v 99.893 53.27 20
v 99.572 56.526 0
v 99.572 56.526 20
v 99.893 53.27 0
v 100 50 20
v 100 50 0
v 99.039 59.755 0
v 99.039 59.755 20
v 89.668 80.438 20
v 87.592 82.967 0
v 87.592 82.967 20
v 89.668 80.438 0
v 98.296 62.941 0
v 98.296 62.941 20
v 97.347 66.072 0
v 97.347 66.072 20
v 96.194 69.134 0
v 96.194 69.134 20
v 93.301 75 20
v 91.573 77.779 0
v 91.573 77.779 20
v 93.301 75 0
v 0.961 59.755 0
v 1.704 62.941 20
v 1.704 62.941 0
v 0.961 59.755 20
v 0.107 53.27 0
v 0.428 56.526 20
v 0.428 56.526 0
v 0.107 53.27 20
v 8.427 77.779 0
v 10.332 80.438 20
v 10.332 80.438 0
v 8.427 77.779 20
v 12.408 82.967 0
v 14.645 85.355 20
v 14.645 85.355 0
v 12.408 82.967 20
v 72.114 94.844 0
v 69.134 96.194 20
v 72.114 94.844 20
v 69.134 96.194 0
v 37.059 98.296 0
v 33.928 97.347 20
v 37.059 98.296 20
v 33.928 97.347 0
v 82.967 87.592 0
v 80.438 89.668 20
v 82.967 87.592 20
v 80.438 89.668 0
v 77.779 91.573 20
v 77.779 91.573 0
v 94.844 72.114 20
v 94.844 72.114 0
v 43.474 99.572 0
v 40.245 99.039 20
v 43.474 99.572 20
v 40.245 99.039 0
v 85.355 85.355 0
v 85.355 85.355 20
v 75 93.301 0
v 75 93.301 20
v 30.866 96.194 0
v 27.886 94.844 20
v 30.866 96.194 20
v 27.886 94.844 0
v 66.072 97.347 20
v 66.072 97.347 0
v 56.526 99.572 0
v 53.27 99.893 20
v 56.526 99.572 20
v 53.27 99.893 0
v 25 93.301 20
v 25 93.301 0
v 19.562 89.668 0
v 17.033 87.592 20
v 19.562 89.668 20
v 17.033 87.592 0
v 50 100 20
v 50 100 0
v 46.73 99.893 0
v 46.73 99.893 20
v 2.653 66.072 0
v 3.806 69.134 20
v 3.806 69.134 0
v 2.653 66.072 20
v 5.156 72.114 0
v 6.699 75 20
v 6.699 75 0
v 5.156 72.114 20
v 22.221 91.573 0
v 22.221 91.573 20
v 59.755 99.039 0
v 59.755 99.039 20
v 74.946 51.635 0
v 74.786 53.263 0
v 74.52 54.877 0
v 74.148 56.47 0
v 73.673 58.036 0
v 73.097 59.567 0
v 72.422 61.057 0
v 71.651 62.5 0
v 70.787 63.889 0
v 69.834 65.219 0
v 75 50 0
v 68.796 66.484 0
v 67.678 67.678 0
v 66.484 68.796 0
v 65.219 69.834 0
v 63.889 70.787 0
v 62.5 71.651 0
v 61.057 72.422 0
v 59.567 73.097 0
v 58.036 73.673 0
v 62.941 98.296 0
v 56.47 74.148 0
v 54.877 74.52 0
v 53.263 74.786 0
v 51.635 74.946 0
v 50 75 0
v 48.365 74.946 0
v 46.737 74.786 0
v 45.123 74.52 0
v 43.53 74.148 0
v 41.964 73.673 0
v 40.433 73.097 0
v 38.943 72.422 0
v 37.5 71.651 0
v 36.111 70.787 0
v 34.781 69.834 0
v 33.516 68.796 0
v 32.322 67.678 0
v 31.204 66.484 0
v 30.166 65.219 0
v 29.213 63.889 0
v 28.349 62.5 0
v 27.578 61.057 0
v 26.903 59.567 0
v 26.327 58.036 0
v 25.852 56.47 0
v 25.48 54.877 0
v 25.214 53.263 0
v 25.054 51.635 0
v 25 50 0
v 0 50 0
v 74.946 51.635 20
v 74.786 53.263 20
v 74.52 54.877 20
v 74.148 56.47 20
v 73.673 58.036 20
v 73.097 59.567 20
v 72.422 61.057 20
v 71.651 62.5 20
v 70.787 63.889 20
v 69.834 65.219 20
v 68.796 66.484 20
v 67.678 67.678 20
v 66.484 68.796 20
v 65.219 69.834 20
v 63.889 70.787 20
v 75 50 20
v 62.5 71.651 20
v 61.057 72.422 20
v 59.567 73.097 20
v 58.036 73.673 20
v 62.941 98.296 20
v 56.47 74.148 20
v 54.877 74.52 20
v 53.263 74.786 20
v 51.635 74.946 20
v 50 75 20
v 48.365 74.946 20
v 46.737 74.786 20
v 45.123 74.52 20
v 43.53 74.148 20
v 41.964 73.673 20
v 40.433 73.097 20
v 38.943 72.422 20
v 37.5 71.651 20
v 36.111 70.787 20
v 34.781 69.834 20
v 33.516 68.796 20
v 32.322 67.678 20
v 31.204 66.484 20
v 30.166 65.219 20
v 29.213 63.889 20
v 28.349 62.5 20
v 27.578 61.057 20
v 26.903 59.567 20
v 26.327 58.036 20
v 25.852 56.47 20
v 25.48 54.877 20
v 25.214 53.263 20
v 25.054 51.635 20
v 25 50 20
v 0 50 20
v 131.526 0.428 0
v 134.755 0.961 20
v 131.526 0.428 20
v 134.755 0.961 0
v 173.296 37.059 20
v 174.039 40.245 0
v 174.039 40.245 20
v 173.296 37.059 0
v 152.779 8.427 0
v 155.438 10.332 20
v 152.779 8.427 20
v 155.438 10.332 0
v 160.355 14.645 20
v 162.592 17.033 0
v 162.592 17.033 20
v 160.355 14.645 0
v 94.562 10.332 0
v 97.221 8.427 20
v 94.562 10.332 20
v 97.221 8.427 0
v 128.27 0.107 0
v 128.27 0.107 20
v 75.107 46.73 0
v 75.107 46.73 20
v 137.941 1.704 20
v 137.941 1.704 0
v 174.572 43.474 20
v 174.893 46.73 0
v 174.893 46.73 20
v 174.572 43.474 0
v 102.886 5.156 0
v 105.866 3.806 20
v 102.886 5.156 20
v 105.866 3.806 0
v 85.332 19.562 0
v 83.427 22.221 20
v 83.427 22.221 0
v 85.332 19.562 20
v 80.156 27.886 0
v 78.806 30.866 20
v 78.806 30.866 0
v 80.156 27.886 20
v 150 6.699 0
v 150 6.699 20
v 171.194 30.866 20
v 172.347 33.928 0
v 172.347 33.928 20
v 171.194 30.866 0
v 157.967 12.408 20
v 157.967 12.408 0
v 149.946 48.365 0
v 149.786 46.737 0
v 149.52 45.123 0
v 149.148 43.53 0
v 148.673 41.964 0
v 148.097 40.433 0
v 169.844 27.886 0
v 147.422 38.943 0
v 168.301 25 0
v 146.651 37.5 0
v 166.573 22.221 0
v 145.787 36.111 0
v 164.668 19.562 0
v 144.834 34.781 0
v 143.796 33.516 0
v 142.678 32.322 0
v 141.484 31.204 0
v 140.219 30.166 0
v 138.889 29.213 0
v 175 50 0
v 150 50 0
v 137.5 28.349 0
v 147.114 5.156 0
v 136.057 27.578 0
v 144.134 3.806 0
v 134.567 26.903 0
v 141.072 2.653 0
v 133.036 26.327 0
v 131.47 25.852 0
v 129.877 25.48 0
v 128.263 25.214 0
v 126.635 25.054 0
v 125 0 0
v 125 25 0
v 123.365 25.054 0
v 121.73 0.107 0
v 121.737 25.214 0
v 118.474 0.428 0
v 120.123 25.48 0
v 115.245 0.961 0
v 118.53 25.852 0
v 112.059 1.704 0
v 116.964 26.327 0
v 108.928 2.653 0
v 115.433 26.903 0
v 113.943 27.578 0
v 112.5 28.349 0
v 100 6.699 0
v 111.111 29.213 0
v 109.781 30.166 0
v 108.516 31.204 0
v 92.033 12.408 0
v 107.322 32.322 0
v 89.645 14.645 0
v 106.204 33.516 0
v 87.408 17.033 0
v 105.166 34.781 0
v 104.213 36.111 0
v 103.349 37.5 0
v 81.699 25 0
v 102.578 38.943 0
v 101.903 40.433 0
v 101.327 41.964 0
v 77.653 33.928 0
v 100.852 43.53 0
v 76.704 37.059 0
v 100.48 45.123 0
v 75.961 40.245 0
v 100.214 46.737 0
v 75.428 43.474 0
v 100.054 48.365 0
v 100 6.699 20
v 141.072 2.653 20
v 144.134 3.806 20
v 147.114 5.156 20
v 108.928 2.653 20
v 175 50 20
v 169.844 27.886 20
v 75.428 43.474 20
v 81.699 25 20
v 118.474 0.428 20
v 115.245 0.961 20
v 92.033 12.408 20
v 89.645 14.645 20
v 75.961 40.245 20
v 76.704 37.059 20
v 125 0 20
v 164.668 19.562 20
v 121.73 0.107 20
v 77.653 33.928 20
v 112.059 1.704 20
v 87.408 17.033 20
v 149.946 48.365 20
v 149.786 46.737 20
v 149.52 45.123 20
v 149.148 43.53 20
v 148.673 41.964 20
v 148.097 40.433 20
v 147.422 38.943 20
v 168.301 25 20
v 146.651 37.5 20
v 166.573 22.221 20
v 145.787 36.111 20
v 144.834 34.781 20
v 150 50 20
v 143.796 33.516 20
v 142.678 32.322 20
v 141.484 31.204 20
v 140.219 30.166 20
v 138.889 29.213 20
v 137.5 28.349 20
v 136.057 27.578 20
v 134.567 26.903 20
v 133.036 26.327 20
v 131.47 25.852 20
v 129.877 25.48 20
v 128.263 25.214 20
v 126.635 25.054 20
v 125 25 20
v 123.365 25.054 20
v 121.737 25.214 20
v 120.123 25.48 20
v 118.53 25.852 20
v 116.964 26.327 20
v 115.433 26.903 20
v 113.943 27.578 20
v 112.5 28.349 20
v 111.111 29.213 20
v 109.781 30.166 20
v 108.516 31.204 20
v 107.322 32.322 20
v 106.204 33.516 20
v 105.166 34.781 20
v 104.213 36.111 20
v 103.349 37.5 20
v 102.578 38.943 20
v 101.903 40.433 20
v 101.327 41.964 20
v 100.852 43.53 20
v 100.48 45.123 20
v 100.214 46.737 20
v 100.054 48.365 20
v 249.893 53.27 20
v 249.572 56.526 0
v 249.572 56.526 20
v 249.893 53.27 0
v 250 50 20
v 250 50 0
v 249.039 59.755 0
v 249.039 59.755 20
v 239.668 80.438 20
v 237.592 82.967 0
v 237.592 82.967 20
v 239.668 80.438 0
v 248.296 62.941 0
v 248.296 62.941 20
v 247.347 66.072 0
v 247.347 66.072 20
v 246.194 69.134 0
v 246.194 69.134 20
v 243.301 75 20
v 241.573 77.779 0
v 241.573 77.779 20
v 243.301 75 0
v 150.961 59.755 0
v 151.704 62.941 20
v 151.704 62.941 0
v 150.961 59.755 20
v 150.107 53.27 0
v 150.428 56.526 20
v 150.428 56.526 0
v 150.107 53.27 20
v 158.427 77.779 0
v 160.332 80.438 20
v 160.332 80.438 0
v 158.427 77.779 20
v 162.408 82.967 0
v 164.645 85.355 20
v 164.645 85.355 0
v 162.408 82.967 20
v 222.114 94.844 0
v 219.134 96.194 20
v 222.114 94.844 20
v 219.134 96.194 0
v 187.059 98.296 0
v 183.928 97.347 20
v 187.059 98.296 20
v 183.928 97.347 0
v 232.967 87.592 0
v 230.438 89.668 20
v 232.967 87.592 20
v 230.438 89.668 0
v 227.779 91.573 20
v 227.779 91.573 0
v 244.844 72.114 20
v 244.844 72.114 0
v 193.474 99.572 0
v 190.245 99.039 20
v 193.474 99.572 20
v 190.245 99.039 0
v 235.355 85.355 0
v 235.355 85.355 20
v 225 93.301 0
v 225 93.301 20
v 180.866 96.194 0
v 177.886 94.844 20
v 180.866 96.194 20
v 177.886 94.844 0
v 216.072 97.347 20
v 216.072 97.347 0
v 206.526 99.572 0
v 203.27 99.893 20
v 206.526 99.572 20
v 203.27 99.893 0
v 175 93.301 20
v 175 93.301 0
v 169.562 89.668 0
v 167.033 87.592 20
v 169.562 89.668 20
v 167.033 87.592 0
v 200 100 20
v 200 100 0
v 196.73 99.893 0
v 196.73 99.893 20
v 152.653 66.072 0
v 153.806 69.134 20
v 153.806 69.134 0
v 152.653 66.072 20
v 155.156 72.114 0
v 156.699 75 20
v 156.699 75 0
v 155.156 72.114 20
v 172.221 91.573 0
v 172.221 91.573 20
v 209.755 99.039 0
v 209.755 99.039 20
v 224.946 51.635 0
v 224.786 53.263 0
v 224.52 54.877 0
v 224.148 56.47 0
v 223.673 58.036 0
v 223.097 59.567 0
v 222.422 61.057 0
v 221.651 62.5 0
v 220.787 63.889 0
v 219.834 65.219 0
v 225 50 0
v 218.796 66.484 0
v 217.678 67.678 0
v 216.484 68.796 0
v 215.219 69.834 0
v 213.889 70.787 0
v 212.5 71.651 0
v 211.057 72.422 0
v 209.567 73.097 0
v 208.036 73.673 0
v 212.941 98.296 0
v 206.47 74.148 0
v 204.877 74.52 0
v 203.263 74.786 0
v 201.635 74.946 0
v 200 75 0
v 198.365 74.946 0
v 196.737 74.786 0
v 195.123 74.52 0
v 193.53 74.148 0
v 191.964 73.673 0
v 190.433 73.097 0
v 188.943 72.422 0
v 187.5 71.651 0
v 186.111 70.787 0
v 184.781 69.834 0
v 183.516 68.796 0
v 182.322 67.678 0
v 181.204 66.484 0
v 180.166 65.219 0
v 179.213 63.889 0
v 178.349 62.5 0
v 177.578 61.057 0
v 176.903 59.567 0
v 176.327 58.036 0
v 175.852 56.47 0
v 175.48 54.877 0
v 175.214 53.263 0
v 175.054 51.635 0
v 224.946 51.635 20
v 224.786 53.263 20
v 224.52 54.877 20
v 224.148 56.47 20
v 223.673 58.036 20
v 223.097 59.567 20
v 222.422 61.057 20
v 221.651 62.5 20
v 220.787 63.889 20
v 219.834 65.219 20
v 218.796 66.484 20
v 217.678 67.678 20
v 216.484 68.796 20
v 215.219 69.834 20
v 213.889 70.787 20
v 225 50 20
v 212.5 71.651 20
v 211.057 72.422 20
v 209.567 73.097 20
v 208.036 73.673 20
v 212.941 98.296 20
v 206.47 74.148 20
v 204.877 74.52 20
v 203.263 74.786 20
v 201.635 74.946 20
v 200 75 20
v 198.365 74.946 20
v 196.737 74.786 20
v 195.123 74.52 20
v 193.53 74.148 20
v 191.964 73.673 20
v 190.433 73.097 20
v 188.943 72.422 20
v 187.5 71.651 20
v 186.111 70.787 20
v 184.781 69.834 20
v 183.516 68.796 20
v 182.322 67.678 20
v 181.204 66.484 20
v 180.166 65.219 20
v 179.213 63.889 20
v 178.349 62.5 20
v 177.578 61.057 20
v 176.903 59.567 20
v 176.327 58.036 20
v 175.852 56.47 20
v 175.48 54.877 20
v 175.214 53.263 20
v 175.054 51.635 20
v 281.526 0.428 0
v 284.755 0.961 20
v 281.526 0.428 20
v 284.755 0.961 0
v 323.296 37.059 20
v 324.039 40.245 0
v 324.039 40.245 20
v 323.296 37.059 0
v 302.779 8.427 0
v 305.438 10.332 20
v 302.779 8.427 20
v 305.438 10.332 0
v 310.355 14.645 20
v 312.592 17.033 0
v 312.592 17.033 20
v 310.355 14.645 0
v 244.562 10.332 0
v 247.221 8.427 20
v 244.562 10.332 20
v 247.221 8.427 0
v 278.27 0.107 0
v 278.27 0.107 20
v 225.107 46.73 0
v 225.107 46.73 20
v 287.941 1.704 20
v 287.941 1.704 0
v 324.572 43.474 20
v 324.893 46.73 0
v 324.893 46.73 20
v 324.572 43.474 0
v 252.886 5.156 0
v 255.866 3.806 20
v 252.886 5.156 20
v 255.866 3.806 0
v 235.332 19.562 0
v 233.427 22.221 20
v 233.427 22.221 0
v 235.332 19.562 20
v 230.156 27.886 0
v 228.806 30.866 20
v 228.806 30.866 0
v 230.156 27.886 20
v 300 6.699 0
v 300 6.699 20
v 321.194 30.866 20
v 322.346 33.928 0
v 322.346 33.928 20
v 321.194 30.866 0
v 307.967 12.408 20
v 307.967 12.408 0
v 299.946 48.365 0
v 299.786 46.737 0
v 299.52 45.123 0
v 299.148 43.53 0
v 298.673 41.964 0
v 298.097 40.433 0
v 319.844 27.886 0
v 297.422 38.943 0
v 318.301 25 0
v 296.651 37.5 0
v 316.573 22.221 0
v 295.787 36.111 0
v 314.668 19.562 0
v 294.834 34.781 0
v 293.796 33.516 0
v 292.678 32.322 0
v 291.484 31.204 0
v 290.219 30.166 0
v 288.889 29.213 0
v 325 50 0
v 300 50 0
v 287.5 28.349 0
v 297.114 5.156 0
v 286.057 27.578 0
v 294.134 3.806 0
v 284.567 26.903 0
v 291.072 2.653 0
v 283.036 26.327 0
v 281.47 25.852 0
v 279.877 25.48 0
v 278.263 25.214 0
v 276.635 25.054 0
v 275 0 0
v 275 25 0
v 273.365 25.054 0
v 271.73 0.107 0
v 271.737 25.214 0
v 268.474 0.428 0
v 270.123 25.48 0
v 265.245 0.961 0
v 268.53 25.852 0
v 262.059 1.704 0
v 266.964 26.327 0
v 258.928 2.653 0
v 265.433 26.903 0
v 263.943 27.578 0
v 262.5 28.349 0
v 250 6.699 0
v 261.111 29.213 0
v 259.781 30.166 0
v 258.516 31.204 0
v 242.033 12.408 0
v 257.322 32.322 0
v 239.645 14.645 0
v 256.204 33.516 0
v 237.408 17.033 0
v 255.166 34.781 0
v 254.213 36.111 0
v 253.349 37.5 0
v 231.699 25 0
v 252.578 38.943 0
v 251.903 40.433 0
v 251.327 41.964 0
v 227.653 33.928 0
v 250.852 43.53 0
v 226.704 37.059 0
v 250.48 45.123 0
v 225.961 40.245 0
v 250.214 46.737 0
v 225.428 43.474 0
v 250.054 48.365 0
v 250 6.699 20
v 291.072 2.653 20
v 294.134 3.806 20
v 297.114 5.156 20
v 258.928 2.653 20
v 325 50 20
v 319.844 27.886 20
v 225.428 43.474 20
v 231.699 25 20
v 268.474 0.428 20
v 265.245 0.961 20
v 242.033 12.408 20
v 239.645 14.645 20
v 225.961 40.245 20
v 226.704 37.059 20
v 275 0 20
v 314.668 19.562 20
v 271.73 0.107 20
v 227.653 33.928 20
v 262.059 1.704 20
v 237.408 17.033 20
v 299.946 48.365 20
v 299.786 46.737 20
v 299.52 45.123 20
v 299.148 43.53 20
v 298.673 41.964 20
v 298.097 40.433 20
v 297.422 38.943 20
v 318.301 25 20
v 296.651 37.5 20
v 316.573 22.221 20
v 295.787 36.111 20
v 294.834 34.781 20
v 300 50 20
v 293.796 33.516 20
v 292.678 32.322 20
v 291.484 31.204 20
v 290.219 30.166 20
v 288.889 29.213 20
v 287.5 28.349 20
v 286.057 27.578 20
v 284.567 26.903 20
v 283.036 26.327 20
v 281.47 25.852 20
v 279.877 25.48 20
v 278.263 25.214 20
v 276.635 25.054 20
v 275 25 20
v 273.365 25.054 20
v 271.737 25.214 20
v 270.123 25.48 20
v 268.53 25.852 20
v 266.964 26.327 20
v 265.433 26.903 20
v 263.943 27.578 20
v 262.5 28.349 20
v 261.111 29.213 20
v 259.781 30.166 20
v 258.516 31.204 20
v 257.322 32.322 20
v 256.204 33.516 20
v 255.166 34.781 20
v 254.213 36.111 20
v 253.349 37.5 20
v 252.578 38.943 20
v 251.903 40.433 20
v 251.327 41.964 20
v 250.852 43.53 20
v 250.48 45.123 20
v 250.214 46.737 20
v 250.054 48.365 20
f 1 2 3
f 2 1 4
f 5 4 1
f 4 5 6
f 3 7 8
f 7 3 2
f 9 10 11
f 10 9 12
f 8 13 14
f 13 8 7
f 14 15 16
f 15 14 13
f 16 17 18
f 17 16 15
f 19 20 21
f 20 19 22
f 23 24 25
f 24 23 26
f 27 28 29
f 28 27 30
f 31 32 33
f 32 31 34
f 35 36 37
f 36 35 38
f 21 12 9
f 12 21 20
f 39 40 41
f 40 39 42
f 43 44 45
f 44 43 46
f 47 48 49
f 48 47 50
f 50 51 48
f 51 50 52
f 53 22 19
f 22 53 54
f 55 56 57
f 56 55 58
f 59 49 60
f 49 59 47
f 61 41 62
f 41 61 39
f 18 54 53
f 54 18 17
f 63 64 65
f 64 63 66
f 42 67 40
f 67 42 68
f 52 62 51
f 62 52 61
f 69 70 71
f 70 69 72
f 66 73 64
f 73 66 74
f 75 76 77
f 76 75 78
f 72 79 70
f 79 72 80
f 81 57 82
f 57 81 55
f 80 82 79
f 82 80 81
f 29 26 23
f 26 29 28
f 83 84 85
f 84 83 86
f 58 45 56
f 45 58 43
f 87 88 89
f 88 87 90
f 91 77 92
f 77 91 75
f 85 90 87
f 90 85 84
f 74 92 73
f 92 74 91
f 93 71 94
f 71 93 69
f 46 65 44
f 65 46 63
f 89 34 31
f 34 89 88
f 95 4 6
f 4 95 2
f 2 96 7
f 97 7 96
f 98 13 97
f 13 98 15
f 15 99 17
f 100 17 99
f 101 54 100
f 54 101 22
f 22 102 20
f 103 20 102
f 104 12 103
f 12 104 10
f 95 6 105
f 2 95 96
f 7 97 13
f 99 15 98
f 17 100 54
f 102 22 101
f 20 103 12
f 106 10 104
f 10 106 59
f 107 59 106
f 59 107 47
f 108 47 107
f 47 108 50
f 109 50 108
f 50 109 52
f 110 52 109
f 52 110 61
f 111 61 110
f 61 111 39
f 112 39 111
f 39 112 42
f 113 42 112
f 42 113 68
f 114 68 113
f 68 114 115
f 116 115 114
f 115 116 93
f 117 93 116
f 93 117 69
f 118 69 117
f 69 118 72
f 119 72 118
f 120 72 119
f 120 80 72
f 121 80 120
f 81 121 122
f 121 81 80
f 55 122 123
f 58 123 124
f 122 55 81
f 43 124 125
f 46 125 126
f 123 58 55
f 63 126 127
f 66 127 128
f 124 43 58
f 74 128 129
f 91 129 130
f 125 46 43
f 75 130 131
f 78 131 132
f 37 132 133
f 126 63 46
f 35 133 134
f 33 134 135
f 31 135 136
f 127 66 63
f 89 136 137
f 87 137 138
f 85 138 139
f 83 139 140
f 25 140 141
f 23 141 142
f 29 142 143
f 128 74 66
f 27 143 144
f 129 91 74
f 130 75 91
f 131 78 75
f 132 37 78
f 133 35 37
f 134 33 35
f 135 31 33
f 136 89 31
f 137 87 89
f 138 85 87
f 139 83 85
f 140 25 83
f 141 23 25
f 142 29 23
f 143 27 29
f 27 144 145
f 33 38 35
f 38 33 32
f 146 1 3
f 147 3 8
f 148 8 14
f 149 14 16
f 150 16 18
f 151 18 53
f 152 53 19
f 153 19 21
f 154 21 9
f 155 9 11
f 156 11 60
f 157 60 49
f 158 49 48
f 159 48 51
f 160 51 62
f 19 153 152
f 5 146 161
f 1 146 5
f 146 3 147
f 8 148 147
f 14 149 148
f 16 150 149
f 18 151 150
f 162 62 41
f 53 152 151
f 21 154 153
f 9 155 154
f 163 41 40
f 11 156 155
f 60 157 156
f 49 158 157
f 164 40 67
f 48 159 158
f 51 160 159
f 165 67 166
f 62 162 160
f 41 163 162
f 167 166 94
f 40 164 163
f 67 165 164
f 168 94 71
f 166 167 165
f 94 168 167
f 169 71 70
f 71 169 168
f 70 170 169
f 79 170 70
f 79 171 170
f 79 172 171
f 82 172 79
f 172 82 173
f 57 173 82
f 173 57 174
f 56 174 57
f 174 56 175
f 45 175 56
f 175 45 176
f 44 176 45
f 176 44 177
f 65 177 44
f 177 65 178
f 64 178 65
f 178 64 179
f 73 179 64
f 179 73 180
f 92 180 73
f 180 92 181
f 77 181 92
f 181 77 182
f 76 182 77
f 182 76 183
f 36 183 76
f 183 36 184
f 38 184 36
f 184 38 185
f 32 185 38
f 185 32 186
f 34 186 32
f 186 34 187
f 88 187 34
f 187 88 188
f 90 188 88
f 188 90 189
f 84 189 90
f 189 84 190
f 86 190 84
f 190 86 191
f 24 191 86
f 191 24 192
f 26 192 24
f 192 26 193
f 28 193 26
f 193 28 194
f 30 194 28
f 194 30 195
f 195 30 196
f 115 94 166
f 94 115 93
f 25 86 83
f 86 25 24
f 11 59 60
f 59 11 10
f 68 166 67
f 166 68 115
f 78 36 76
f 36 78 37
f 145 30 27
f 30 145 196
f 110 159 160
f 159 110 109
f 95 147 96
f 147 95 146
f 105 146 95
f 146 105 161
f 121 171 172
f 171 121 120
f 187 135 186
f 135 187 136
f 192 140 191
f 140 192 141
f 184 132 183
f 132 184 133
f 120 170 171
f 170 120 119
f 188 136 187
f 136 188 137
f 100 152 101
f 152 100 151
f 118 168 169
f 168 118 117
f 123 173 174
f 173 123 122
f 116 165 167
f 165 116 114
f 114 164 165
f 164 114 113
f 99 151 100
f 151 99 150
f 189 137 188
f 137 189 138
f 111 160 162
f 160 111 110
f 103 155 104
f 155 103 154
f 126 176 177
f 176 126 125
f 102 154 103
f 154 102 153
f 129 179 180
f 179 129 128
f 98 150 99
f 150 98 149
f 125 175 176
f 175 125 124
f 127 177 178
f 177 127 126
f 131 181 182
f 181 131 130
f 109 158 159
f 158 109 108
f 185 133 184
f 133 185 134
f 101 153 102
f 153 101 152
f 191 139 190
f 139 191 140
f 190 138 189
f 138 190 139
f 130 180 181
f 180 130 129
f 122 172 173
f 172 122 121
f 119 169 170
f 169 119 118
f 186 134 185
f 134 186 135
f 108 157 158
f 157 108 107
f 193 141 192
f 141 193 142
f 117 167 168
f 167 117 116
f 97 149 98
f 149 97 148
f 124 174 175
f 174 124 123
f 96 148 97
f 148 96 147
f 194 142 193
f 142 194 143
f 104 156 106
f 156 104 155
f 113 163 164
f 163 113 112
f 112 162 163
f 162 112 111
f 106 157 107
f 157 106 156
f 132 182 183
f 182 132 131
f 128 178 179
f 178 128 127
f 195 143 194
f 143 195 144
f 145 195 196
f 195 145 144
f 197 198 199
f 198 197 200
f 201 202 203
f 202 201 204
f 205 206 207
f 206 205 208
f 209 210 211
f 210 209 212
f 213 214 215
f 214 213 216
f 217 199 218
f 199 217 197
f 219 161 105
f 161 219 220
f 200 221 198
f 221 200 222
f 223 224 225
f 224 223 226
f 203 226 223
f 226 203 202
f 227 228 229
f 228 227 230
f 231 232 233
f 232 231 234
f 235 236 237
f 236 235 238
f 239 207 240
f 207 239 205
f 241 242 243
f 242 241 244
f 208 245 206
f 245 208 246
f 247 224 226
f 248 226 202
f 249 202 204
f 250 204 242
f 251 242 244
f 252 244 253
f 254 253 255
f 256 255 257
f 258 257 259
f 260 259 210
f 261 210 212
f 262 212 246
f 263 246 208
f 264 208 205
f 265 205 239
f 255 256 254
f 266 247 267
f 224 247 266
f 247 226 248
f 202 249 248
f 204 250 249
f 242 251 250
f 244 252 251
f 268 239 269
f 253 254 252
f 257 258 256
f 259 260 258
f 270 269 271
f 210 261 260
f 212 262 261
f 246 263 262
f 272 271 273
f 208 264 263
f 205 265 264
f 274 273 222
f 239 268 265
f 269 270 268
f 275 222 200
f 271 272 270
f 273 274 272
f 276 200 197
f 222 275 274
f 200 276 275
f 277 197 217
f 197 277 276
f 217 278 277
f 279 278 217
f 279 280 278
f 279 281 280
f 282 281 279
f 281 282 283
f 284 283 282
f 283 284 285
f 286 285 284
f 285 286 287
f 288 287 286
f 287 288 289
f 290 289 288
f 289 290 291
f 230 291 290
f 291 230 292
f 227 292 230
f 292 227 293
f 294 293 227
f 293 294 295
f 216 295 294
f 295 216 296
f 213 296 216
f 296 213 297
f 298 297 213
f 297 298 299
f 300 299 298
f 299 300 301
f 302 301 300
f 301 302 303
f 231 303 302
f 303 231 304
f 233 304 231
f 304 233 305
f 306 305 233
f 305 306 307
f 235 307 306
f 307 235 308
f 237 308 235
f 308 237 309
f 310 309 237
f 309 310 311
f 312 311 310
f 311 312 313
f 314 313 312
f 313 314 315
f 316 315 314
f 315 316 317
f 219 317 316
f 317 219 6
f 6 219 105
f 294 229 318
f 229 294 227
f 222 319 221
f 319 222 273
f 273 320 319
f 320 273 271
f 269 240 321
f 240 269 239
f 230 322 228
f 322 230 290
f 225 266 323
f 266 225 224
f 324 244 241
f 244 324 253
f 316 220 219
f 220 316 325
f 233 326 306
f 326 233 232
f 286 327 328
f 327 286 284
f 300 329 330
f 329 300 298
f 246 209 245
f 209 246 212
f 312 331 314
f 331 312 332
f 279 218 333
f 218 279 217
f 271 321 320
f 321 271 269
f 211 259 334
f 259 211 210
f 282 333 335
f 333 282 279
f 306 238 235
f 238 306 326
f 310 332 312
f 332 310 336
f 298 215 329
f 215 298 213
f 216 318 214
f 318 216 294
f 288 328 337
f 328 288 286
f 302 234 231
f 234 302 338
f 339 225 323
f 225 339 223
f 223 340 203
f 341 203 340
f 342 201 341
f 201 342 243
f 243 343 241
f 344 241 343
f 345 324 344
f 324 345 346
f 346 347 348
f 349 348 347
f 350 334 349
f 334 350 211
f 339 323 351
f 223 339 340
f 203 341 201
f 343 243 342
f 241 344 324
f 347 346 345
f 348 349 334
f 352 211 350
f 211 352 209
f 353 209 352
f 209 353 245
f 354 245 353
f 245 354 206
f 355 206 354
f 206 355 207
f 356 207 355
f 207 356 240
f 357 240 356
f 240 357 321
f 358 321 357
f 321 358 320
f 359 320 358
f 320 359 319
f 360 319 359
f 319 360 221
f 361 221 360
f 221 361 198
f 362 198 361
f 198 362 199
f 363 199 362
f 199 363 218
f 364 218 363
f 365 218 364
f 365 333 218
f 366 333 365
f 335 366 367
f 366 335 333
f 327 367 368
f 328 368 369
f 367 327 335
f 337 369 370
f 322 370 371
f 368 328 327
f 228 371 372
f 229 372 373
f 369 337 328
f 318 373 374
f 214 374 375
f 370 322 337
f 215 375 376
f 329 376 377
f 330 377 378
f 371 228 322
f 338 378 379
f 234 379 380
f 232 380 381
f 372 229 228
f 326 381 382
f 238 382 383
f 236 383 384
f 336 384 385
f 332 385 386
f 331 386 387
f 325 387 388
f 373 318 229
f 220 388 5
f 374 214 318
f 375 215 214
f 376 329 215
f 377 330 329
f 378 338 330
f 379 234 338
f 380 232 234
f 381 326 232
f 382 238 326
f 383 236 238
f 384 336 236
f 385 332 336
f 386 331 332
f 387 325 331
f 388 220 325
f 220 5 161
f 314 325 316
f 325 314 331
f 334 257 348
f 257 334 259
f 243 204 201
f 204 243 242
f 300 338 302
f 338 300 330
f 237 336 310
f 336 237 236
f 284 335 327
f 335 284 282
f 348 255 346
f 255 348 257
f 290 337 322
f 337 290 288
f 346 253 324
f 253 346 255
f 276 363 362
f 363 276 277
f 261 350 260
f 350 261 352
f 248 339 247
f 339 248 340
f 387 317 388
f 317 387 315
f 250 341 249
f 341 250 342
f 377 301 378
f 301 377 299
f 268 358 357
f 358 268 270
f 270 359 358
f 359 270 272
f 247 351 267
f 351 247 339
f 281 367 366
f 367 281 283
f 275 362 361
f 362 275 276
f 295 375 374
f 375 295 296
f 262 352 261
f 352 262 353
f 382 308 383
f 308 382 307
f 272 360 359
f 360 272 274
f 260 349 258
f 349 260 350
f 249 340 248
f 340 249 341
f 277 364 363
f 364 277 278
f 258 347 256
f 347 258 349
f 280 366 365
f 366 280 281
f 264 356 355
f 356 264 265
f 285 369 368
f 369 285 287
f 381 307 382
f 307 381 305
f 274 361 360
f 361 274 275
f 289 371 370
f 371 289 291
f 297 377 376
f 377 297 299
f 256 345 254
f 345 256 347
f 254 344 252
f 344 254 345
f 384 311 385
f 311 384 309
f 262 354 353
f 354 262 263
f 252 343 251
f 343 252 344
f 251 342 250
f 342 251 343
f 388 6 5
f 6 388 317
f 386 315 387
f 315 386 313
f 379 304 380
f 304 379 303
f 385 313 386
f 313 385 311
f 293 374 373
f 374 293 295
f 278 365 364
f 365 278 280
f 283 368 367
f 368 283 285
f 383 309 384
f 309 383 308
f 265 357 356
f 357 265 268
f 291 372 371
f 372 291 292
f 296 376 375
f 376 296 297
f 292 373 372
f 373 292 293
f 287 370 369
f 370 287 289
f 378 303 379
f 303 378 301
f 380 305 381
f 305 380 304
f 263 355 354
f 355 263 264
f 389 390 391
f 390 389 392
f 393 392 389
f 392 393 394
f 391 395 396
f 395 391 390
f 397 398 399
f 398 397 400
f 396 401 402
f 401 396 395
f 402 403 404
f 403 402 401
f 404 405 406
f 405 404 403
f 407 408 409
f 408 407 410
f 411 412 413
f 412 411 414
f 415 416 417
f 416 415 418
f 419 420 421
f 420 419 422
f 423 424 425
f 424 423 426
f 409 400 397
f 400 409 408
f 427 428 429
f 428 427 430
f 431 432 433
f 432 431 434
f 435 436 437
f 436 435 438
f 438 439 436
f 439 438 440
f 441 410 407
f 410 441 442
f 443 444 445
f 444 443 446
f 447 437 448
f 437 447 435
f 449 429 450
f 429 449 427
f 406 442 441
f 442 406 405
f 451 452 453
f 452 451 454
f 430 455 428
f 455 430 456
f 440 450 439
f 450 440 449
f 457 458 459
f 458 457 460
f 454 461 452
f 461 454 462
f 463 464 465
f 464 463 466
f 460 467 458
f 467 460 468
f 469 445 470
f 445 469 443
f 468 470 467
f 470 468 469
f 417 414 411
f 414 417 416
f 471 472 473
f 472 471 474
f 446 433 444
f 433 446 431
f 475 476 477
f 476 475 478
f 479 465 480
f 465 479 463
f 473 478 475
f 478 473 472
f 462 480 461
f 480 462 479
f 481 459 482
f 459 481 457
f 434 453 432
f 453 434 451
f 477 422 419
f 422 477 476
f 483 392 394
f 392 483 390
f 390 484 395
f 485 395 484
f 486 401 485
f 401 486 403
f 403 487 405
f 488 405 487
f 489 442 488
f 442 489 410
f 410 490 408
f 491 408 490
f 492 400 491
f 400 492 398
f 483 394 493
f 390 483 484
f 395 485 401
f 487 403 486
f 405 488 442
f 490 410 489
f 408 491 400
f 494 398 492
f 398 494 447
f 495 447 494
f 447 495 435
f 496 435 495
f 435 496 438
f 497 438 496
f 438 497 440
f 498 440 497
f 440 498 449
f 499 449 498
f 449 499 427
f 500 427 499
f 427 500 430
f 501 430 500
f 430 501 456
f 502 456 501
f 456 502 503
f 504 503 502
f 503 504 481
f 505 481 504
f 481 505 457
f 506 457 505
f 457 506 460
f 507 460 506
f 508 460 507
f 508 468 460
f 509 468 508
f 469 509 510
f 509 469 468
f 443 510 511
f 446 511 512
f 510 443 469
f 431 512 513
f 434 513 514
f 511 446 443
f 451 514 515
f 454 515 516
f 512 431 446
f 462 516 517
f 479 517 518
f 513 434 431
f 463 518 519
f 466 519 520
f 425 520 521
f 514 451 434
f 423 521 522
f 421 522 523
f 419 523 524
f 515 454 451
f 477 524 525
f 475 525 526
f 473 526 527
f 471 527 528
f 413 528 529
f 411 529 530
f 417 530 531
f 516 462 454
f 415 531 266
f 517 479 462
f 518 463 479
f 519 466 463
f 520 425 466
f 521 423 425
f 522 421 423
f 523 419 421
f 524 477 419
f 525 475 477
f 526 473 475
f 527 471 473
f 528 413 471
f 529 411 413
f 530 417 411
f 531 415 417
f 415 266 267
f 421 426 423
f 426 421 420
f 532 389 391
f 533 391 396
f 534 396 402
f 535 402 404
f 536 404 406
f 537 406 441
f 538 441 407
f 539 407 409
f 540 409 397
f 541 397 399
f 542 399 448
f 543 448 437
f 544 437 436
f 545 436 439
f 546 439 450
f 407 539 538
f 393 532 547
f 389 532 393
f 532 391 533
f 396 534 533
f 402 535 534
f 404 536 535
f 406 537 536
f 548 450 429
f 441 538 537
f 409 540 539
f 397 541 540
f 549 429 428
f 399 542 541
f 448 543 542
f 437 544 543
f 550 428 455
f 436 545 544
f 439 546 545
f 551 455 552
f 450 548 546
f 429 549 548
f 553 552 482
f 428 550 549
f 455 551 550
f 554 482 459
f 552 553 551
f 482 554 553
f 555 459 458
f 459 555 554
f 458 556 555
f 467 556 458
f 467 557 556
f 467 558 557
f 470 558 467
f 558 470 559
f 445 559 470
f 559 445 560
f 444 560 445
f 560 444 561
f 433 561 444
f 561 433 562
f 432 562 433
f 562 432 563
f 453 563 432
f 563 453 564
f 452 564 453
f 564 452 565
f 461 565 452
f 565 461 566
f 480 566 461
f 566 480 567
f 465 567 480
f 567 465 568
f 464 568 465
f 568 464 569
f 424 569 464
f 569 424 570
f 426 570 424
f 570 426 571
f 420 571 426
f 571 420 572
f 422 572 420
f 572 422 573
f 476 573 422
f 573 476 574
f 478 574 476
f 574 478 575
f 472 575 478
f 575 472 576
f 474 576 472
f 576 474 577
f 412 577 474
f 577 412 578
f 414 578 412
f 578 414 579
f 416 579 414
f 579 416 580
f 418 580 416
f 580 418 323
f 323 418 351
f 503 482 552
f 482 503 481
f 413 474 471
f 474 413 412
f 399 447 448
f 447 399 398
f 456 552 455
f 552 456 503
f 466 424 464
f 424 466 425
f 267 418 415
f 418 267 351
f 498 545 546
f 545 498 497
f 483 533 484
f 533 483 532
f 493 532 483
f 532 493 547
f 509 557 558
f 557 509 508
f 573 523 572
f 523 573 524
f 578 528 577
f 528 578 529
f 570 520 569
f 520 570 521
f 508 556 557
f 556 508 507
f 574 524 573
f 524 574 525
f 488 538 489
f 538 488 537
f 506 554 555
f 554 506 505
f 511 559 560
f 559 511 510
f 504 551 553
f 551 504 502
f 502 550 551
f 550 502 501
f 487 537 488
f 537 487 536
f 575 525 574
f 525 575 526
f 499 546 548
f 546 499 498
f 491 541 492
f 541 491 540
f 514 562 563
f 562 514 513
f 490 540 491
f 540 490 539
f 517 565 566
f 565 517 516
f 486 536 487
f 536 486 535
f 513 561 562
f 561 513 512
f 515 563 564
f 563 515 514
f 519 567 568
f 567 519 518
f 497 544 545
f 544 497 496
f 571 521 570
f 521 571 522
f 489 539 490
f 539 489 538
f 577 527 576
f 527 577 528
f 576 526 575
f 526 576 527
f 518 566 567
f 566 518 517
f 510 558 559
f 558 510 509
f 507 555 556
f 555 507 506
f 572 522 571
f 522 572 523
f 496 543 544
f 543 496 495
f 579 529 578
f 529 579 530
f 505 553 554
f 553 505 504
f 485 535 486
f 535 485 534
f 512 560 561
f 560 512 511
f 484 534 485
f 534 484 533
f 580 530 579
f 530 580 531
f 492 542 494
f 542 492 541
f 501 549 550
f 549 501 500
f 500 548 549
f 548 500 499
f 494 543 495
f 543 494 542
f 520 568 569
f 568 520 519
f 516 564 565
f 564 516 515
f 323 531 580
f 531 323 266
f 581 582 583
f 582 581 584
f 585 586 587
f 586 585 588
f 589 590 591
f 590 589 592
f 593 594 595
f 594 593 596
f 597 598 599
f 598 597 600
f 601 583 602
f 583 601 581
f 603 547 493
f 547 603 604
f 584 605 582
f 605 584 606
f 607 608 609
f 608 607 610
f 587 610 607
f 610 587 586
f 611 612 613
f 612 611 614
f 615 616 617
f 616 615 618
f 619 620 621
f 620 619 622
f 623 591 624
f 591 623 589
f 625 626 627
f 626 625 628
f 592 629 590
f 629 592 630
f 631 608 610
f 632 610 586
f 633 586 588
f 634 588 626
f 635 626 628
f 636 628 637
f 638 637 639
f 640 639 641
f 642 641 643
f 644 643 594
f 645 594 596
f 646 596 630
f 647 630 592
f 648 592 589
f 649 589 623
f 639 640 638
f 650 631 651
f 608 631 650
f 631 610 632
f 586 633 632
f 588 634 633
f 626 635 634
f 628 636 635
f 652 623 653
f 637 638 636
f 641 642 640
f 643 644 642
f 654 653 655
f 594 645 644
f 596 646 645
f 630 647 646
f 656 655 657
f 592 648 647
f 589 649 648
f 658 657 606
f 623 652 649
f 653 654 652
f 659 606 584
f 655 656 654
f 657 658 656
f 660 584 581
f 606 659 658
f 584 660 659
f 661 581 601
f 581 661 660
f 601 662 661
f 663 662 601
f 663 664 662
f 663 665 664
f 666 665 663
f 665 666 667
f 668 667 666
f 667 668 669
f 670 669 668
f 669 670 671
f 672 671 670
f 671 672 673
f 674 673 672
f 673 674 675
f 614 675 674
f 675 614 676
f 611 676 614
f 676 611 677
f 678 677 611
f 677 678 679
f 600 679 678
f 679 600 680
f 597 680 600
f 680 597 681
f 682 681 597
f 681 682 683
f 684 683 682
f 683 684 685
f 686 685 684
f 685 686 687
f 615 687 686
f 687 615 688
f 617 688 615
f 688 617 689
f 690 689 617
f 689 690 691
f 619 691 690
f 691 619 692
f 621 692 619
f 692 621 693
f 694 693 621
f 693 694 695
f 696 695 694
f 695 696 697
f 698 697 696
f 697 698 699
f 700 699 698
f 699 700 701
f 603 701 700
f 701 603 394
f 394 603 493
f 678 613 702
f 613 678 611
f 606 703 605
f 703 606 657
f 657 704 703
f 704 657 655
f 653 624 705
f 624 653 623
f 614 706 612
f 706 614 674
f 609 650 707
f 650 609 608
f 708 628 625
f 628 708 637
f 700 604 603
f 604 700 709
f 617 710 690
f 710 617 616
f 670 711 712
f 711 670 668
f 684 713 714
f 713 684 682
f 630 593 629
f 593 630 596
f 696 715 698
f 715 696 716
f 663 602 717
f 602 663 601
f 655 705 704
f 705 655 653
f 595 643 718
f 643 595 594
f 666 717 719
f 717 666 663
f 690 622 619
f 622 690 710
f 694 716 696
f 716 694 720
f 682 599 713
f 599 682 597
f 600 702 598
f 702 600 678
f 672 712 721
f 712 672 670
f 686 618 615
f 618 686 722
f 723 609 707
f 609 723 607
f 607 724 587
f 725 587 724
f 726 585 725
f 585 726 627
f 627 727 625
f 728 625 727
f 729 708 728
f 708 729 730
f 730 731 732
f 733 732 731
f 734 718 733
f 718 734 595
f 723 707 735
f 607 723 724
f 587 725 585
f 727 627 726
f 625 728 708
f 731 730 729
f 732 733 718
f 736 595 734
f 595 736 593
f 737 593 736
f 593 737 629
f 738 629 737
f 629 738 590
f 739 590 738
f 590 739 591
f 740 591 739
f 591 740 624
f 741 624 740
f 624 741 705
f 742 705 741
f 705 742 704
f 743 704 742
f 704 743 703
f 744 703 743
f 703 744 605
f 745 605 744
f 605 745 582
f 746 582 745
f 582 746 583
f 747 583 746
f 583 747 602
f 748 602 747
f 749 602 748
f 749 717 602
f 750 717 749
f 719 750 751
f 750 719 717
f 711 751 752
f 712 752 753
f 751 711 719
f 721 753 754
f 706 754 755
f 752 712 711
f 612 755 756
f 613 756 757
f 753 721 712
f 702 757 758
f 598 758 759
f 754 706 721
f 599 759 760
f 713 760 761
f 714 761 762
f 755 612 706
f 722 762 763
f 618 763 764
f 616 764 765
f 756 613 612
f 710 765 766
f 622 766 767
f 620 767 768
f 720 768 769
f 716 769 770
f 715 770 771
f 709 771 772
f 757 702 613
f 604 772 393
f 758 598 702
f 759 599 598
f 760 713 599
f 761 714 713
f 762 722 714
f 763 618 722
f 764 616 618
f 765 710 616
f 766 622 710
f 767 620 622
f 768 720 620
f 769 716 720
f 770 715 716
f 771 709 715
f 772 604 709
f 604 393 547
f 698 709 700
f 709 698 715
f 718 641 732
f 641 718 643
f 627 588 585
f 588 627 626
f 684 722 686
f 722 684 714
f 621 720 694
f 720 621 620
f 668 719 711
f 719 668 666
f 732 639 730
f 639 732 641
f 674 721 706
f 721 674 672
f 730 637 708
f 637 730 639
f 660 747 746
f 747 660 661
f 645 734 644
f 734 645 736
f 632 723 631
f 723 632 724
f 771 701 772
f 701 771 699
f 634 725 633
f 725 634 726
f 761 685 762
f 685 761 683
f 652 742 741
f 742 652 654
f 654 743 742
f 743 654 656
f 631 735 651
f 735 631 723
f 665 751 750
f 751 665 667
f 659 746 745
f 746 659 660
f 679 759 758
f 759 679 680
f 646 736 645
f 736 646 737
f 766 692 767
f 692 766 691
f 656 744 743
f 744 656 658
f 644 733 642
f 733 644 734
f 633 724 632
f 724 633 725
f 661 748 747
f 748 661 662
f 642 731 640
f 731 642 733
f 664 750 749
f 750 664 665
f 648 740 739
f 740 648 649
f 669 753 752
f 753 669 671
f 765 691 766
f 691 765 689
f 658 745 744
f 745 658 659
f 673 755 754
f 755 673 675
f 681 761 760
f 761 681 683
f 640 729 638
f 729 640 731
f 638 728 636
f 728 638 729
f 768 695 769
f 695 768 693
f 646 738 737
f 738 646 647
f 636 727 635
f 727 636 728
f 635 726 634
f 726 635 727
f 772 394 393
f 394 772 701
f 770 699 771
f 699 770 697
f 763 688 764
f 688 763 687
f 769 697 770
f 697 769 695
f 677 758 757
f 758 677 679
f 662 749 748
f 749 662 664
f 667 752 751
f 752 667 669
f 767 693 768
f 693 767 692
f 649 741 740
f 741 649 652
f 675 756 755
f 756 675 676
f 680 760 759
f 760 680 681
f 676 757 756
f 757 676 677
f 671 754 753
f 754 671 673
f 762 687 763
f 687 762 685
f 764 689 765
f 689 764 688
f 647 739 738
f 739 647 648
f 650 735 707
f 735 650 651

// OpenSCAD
// wave form
// 21.06.2026 Sebastian Weigl

$fn = 96;

obj_heigth = 20;

// first body
difference() {
// main body
  translate([50,50,0])
  cylinder(h=obj_heigth,r=50,center=false);

  // inner body
  translate([50,50,0])
  cylinder(h=obj_heigth,r=25,center=false);
  translate([0,0,0])
  cube([100,50,obj_heigth]);}

// second body
translate([75,0,0])
difference() {
// main body
  translate([50,50,0])
  cylinder(h=obj_heigth,r=50,center=false);

  // inner body
  translate([50,50,0])
  cylinder(h=obj_heigth,r=25,center=false);
  translate([0,50,0])
  cube([100,50,obj_heigth]);}
  
// third body
translate([150,0,0])
difference() {
// main body
  translate([50,50,0])
  cylinder(h=obj_heigth,r=50,center=false);

  // inner body
  translate([50,50,0])
  cylinder(h=obj_heigth,r=25,center=false);
  translate([0,0,0])
  cube([100,50,obj_heigth]);}
  
// forth body
translate([225,0,0])
difference() {
// main body
  translate([50,50,0])
  cylinder(h=obj_heigth,r=50,center=false);

  // inner body
  translate([50,50,0])
  cylinder(h=obj_heigth,r=25,center=false);
  translate([0,50,0])
  cube([100,50,obj_heigth]);}
